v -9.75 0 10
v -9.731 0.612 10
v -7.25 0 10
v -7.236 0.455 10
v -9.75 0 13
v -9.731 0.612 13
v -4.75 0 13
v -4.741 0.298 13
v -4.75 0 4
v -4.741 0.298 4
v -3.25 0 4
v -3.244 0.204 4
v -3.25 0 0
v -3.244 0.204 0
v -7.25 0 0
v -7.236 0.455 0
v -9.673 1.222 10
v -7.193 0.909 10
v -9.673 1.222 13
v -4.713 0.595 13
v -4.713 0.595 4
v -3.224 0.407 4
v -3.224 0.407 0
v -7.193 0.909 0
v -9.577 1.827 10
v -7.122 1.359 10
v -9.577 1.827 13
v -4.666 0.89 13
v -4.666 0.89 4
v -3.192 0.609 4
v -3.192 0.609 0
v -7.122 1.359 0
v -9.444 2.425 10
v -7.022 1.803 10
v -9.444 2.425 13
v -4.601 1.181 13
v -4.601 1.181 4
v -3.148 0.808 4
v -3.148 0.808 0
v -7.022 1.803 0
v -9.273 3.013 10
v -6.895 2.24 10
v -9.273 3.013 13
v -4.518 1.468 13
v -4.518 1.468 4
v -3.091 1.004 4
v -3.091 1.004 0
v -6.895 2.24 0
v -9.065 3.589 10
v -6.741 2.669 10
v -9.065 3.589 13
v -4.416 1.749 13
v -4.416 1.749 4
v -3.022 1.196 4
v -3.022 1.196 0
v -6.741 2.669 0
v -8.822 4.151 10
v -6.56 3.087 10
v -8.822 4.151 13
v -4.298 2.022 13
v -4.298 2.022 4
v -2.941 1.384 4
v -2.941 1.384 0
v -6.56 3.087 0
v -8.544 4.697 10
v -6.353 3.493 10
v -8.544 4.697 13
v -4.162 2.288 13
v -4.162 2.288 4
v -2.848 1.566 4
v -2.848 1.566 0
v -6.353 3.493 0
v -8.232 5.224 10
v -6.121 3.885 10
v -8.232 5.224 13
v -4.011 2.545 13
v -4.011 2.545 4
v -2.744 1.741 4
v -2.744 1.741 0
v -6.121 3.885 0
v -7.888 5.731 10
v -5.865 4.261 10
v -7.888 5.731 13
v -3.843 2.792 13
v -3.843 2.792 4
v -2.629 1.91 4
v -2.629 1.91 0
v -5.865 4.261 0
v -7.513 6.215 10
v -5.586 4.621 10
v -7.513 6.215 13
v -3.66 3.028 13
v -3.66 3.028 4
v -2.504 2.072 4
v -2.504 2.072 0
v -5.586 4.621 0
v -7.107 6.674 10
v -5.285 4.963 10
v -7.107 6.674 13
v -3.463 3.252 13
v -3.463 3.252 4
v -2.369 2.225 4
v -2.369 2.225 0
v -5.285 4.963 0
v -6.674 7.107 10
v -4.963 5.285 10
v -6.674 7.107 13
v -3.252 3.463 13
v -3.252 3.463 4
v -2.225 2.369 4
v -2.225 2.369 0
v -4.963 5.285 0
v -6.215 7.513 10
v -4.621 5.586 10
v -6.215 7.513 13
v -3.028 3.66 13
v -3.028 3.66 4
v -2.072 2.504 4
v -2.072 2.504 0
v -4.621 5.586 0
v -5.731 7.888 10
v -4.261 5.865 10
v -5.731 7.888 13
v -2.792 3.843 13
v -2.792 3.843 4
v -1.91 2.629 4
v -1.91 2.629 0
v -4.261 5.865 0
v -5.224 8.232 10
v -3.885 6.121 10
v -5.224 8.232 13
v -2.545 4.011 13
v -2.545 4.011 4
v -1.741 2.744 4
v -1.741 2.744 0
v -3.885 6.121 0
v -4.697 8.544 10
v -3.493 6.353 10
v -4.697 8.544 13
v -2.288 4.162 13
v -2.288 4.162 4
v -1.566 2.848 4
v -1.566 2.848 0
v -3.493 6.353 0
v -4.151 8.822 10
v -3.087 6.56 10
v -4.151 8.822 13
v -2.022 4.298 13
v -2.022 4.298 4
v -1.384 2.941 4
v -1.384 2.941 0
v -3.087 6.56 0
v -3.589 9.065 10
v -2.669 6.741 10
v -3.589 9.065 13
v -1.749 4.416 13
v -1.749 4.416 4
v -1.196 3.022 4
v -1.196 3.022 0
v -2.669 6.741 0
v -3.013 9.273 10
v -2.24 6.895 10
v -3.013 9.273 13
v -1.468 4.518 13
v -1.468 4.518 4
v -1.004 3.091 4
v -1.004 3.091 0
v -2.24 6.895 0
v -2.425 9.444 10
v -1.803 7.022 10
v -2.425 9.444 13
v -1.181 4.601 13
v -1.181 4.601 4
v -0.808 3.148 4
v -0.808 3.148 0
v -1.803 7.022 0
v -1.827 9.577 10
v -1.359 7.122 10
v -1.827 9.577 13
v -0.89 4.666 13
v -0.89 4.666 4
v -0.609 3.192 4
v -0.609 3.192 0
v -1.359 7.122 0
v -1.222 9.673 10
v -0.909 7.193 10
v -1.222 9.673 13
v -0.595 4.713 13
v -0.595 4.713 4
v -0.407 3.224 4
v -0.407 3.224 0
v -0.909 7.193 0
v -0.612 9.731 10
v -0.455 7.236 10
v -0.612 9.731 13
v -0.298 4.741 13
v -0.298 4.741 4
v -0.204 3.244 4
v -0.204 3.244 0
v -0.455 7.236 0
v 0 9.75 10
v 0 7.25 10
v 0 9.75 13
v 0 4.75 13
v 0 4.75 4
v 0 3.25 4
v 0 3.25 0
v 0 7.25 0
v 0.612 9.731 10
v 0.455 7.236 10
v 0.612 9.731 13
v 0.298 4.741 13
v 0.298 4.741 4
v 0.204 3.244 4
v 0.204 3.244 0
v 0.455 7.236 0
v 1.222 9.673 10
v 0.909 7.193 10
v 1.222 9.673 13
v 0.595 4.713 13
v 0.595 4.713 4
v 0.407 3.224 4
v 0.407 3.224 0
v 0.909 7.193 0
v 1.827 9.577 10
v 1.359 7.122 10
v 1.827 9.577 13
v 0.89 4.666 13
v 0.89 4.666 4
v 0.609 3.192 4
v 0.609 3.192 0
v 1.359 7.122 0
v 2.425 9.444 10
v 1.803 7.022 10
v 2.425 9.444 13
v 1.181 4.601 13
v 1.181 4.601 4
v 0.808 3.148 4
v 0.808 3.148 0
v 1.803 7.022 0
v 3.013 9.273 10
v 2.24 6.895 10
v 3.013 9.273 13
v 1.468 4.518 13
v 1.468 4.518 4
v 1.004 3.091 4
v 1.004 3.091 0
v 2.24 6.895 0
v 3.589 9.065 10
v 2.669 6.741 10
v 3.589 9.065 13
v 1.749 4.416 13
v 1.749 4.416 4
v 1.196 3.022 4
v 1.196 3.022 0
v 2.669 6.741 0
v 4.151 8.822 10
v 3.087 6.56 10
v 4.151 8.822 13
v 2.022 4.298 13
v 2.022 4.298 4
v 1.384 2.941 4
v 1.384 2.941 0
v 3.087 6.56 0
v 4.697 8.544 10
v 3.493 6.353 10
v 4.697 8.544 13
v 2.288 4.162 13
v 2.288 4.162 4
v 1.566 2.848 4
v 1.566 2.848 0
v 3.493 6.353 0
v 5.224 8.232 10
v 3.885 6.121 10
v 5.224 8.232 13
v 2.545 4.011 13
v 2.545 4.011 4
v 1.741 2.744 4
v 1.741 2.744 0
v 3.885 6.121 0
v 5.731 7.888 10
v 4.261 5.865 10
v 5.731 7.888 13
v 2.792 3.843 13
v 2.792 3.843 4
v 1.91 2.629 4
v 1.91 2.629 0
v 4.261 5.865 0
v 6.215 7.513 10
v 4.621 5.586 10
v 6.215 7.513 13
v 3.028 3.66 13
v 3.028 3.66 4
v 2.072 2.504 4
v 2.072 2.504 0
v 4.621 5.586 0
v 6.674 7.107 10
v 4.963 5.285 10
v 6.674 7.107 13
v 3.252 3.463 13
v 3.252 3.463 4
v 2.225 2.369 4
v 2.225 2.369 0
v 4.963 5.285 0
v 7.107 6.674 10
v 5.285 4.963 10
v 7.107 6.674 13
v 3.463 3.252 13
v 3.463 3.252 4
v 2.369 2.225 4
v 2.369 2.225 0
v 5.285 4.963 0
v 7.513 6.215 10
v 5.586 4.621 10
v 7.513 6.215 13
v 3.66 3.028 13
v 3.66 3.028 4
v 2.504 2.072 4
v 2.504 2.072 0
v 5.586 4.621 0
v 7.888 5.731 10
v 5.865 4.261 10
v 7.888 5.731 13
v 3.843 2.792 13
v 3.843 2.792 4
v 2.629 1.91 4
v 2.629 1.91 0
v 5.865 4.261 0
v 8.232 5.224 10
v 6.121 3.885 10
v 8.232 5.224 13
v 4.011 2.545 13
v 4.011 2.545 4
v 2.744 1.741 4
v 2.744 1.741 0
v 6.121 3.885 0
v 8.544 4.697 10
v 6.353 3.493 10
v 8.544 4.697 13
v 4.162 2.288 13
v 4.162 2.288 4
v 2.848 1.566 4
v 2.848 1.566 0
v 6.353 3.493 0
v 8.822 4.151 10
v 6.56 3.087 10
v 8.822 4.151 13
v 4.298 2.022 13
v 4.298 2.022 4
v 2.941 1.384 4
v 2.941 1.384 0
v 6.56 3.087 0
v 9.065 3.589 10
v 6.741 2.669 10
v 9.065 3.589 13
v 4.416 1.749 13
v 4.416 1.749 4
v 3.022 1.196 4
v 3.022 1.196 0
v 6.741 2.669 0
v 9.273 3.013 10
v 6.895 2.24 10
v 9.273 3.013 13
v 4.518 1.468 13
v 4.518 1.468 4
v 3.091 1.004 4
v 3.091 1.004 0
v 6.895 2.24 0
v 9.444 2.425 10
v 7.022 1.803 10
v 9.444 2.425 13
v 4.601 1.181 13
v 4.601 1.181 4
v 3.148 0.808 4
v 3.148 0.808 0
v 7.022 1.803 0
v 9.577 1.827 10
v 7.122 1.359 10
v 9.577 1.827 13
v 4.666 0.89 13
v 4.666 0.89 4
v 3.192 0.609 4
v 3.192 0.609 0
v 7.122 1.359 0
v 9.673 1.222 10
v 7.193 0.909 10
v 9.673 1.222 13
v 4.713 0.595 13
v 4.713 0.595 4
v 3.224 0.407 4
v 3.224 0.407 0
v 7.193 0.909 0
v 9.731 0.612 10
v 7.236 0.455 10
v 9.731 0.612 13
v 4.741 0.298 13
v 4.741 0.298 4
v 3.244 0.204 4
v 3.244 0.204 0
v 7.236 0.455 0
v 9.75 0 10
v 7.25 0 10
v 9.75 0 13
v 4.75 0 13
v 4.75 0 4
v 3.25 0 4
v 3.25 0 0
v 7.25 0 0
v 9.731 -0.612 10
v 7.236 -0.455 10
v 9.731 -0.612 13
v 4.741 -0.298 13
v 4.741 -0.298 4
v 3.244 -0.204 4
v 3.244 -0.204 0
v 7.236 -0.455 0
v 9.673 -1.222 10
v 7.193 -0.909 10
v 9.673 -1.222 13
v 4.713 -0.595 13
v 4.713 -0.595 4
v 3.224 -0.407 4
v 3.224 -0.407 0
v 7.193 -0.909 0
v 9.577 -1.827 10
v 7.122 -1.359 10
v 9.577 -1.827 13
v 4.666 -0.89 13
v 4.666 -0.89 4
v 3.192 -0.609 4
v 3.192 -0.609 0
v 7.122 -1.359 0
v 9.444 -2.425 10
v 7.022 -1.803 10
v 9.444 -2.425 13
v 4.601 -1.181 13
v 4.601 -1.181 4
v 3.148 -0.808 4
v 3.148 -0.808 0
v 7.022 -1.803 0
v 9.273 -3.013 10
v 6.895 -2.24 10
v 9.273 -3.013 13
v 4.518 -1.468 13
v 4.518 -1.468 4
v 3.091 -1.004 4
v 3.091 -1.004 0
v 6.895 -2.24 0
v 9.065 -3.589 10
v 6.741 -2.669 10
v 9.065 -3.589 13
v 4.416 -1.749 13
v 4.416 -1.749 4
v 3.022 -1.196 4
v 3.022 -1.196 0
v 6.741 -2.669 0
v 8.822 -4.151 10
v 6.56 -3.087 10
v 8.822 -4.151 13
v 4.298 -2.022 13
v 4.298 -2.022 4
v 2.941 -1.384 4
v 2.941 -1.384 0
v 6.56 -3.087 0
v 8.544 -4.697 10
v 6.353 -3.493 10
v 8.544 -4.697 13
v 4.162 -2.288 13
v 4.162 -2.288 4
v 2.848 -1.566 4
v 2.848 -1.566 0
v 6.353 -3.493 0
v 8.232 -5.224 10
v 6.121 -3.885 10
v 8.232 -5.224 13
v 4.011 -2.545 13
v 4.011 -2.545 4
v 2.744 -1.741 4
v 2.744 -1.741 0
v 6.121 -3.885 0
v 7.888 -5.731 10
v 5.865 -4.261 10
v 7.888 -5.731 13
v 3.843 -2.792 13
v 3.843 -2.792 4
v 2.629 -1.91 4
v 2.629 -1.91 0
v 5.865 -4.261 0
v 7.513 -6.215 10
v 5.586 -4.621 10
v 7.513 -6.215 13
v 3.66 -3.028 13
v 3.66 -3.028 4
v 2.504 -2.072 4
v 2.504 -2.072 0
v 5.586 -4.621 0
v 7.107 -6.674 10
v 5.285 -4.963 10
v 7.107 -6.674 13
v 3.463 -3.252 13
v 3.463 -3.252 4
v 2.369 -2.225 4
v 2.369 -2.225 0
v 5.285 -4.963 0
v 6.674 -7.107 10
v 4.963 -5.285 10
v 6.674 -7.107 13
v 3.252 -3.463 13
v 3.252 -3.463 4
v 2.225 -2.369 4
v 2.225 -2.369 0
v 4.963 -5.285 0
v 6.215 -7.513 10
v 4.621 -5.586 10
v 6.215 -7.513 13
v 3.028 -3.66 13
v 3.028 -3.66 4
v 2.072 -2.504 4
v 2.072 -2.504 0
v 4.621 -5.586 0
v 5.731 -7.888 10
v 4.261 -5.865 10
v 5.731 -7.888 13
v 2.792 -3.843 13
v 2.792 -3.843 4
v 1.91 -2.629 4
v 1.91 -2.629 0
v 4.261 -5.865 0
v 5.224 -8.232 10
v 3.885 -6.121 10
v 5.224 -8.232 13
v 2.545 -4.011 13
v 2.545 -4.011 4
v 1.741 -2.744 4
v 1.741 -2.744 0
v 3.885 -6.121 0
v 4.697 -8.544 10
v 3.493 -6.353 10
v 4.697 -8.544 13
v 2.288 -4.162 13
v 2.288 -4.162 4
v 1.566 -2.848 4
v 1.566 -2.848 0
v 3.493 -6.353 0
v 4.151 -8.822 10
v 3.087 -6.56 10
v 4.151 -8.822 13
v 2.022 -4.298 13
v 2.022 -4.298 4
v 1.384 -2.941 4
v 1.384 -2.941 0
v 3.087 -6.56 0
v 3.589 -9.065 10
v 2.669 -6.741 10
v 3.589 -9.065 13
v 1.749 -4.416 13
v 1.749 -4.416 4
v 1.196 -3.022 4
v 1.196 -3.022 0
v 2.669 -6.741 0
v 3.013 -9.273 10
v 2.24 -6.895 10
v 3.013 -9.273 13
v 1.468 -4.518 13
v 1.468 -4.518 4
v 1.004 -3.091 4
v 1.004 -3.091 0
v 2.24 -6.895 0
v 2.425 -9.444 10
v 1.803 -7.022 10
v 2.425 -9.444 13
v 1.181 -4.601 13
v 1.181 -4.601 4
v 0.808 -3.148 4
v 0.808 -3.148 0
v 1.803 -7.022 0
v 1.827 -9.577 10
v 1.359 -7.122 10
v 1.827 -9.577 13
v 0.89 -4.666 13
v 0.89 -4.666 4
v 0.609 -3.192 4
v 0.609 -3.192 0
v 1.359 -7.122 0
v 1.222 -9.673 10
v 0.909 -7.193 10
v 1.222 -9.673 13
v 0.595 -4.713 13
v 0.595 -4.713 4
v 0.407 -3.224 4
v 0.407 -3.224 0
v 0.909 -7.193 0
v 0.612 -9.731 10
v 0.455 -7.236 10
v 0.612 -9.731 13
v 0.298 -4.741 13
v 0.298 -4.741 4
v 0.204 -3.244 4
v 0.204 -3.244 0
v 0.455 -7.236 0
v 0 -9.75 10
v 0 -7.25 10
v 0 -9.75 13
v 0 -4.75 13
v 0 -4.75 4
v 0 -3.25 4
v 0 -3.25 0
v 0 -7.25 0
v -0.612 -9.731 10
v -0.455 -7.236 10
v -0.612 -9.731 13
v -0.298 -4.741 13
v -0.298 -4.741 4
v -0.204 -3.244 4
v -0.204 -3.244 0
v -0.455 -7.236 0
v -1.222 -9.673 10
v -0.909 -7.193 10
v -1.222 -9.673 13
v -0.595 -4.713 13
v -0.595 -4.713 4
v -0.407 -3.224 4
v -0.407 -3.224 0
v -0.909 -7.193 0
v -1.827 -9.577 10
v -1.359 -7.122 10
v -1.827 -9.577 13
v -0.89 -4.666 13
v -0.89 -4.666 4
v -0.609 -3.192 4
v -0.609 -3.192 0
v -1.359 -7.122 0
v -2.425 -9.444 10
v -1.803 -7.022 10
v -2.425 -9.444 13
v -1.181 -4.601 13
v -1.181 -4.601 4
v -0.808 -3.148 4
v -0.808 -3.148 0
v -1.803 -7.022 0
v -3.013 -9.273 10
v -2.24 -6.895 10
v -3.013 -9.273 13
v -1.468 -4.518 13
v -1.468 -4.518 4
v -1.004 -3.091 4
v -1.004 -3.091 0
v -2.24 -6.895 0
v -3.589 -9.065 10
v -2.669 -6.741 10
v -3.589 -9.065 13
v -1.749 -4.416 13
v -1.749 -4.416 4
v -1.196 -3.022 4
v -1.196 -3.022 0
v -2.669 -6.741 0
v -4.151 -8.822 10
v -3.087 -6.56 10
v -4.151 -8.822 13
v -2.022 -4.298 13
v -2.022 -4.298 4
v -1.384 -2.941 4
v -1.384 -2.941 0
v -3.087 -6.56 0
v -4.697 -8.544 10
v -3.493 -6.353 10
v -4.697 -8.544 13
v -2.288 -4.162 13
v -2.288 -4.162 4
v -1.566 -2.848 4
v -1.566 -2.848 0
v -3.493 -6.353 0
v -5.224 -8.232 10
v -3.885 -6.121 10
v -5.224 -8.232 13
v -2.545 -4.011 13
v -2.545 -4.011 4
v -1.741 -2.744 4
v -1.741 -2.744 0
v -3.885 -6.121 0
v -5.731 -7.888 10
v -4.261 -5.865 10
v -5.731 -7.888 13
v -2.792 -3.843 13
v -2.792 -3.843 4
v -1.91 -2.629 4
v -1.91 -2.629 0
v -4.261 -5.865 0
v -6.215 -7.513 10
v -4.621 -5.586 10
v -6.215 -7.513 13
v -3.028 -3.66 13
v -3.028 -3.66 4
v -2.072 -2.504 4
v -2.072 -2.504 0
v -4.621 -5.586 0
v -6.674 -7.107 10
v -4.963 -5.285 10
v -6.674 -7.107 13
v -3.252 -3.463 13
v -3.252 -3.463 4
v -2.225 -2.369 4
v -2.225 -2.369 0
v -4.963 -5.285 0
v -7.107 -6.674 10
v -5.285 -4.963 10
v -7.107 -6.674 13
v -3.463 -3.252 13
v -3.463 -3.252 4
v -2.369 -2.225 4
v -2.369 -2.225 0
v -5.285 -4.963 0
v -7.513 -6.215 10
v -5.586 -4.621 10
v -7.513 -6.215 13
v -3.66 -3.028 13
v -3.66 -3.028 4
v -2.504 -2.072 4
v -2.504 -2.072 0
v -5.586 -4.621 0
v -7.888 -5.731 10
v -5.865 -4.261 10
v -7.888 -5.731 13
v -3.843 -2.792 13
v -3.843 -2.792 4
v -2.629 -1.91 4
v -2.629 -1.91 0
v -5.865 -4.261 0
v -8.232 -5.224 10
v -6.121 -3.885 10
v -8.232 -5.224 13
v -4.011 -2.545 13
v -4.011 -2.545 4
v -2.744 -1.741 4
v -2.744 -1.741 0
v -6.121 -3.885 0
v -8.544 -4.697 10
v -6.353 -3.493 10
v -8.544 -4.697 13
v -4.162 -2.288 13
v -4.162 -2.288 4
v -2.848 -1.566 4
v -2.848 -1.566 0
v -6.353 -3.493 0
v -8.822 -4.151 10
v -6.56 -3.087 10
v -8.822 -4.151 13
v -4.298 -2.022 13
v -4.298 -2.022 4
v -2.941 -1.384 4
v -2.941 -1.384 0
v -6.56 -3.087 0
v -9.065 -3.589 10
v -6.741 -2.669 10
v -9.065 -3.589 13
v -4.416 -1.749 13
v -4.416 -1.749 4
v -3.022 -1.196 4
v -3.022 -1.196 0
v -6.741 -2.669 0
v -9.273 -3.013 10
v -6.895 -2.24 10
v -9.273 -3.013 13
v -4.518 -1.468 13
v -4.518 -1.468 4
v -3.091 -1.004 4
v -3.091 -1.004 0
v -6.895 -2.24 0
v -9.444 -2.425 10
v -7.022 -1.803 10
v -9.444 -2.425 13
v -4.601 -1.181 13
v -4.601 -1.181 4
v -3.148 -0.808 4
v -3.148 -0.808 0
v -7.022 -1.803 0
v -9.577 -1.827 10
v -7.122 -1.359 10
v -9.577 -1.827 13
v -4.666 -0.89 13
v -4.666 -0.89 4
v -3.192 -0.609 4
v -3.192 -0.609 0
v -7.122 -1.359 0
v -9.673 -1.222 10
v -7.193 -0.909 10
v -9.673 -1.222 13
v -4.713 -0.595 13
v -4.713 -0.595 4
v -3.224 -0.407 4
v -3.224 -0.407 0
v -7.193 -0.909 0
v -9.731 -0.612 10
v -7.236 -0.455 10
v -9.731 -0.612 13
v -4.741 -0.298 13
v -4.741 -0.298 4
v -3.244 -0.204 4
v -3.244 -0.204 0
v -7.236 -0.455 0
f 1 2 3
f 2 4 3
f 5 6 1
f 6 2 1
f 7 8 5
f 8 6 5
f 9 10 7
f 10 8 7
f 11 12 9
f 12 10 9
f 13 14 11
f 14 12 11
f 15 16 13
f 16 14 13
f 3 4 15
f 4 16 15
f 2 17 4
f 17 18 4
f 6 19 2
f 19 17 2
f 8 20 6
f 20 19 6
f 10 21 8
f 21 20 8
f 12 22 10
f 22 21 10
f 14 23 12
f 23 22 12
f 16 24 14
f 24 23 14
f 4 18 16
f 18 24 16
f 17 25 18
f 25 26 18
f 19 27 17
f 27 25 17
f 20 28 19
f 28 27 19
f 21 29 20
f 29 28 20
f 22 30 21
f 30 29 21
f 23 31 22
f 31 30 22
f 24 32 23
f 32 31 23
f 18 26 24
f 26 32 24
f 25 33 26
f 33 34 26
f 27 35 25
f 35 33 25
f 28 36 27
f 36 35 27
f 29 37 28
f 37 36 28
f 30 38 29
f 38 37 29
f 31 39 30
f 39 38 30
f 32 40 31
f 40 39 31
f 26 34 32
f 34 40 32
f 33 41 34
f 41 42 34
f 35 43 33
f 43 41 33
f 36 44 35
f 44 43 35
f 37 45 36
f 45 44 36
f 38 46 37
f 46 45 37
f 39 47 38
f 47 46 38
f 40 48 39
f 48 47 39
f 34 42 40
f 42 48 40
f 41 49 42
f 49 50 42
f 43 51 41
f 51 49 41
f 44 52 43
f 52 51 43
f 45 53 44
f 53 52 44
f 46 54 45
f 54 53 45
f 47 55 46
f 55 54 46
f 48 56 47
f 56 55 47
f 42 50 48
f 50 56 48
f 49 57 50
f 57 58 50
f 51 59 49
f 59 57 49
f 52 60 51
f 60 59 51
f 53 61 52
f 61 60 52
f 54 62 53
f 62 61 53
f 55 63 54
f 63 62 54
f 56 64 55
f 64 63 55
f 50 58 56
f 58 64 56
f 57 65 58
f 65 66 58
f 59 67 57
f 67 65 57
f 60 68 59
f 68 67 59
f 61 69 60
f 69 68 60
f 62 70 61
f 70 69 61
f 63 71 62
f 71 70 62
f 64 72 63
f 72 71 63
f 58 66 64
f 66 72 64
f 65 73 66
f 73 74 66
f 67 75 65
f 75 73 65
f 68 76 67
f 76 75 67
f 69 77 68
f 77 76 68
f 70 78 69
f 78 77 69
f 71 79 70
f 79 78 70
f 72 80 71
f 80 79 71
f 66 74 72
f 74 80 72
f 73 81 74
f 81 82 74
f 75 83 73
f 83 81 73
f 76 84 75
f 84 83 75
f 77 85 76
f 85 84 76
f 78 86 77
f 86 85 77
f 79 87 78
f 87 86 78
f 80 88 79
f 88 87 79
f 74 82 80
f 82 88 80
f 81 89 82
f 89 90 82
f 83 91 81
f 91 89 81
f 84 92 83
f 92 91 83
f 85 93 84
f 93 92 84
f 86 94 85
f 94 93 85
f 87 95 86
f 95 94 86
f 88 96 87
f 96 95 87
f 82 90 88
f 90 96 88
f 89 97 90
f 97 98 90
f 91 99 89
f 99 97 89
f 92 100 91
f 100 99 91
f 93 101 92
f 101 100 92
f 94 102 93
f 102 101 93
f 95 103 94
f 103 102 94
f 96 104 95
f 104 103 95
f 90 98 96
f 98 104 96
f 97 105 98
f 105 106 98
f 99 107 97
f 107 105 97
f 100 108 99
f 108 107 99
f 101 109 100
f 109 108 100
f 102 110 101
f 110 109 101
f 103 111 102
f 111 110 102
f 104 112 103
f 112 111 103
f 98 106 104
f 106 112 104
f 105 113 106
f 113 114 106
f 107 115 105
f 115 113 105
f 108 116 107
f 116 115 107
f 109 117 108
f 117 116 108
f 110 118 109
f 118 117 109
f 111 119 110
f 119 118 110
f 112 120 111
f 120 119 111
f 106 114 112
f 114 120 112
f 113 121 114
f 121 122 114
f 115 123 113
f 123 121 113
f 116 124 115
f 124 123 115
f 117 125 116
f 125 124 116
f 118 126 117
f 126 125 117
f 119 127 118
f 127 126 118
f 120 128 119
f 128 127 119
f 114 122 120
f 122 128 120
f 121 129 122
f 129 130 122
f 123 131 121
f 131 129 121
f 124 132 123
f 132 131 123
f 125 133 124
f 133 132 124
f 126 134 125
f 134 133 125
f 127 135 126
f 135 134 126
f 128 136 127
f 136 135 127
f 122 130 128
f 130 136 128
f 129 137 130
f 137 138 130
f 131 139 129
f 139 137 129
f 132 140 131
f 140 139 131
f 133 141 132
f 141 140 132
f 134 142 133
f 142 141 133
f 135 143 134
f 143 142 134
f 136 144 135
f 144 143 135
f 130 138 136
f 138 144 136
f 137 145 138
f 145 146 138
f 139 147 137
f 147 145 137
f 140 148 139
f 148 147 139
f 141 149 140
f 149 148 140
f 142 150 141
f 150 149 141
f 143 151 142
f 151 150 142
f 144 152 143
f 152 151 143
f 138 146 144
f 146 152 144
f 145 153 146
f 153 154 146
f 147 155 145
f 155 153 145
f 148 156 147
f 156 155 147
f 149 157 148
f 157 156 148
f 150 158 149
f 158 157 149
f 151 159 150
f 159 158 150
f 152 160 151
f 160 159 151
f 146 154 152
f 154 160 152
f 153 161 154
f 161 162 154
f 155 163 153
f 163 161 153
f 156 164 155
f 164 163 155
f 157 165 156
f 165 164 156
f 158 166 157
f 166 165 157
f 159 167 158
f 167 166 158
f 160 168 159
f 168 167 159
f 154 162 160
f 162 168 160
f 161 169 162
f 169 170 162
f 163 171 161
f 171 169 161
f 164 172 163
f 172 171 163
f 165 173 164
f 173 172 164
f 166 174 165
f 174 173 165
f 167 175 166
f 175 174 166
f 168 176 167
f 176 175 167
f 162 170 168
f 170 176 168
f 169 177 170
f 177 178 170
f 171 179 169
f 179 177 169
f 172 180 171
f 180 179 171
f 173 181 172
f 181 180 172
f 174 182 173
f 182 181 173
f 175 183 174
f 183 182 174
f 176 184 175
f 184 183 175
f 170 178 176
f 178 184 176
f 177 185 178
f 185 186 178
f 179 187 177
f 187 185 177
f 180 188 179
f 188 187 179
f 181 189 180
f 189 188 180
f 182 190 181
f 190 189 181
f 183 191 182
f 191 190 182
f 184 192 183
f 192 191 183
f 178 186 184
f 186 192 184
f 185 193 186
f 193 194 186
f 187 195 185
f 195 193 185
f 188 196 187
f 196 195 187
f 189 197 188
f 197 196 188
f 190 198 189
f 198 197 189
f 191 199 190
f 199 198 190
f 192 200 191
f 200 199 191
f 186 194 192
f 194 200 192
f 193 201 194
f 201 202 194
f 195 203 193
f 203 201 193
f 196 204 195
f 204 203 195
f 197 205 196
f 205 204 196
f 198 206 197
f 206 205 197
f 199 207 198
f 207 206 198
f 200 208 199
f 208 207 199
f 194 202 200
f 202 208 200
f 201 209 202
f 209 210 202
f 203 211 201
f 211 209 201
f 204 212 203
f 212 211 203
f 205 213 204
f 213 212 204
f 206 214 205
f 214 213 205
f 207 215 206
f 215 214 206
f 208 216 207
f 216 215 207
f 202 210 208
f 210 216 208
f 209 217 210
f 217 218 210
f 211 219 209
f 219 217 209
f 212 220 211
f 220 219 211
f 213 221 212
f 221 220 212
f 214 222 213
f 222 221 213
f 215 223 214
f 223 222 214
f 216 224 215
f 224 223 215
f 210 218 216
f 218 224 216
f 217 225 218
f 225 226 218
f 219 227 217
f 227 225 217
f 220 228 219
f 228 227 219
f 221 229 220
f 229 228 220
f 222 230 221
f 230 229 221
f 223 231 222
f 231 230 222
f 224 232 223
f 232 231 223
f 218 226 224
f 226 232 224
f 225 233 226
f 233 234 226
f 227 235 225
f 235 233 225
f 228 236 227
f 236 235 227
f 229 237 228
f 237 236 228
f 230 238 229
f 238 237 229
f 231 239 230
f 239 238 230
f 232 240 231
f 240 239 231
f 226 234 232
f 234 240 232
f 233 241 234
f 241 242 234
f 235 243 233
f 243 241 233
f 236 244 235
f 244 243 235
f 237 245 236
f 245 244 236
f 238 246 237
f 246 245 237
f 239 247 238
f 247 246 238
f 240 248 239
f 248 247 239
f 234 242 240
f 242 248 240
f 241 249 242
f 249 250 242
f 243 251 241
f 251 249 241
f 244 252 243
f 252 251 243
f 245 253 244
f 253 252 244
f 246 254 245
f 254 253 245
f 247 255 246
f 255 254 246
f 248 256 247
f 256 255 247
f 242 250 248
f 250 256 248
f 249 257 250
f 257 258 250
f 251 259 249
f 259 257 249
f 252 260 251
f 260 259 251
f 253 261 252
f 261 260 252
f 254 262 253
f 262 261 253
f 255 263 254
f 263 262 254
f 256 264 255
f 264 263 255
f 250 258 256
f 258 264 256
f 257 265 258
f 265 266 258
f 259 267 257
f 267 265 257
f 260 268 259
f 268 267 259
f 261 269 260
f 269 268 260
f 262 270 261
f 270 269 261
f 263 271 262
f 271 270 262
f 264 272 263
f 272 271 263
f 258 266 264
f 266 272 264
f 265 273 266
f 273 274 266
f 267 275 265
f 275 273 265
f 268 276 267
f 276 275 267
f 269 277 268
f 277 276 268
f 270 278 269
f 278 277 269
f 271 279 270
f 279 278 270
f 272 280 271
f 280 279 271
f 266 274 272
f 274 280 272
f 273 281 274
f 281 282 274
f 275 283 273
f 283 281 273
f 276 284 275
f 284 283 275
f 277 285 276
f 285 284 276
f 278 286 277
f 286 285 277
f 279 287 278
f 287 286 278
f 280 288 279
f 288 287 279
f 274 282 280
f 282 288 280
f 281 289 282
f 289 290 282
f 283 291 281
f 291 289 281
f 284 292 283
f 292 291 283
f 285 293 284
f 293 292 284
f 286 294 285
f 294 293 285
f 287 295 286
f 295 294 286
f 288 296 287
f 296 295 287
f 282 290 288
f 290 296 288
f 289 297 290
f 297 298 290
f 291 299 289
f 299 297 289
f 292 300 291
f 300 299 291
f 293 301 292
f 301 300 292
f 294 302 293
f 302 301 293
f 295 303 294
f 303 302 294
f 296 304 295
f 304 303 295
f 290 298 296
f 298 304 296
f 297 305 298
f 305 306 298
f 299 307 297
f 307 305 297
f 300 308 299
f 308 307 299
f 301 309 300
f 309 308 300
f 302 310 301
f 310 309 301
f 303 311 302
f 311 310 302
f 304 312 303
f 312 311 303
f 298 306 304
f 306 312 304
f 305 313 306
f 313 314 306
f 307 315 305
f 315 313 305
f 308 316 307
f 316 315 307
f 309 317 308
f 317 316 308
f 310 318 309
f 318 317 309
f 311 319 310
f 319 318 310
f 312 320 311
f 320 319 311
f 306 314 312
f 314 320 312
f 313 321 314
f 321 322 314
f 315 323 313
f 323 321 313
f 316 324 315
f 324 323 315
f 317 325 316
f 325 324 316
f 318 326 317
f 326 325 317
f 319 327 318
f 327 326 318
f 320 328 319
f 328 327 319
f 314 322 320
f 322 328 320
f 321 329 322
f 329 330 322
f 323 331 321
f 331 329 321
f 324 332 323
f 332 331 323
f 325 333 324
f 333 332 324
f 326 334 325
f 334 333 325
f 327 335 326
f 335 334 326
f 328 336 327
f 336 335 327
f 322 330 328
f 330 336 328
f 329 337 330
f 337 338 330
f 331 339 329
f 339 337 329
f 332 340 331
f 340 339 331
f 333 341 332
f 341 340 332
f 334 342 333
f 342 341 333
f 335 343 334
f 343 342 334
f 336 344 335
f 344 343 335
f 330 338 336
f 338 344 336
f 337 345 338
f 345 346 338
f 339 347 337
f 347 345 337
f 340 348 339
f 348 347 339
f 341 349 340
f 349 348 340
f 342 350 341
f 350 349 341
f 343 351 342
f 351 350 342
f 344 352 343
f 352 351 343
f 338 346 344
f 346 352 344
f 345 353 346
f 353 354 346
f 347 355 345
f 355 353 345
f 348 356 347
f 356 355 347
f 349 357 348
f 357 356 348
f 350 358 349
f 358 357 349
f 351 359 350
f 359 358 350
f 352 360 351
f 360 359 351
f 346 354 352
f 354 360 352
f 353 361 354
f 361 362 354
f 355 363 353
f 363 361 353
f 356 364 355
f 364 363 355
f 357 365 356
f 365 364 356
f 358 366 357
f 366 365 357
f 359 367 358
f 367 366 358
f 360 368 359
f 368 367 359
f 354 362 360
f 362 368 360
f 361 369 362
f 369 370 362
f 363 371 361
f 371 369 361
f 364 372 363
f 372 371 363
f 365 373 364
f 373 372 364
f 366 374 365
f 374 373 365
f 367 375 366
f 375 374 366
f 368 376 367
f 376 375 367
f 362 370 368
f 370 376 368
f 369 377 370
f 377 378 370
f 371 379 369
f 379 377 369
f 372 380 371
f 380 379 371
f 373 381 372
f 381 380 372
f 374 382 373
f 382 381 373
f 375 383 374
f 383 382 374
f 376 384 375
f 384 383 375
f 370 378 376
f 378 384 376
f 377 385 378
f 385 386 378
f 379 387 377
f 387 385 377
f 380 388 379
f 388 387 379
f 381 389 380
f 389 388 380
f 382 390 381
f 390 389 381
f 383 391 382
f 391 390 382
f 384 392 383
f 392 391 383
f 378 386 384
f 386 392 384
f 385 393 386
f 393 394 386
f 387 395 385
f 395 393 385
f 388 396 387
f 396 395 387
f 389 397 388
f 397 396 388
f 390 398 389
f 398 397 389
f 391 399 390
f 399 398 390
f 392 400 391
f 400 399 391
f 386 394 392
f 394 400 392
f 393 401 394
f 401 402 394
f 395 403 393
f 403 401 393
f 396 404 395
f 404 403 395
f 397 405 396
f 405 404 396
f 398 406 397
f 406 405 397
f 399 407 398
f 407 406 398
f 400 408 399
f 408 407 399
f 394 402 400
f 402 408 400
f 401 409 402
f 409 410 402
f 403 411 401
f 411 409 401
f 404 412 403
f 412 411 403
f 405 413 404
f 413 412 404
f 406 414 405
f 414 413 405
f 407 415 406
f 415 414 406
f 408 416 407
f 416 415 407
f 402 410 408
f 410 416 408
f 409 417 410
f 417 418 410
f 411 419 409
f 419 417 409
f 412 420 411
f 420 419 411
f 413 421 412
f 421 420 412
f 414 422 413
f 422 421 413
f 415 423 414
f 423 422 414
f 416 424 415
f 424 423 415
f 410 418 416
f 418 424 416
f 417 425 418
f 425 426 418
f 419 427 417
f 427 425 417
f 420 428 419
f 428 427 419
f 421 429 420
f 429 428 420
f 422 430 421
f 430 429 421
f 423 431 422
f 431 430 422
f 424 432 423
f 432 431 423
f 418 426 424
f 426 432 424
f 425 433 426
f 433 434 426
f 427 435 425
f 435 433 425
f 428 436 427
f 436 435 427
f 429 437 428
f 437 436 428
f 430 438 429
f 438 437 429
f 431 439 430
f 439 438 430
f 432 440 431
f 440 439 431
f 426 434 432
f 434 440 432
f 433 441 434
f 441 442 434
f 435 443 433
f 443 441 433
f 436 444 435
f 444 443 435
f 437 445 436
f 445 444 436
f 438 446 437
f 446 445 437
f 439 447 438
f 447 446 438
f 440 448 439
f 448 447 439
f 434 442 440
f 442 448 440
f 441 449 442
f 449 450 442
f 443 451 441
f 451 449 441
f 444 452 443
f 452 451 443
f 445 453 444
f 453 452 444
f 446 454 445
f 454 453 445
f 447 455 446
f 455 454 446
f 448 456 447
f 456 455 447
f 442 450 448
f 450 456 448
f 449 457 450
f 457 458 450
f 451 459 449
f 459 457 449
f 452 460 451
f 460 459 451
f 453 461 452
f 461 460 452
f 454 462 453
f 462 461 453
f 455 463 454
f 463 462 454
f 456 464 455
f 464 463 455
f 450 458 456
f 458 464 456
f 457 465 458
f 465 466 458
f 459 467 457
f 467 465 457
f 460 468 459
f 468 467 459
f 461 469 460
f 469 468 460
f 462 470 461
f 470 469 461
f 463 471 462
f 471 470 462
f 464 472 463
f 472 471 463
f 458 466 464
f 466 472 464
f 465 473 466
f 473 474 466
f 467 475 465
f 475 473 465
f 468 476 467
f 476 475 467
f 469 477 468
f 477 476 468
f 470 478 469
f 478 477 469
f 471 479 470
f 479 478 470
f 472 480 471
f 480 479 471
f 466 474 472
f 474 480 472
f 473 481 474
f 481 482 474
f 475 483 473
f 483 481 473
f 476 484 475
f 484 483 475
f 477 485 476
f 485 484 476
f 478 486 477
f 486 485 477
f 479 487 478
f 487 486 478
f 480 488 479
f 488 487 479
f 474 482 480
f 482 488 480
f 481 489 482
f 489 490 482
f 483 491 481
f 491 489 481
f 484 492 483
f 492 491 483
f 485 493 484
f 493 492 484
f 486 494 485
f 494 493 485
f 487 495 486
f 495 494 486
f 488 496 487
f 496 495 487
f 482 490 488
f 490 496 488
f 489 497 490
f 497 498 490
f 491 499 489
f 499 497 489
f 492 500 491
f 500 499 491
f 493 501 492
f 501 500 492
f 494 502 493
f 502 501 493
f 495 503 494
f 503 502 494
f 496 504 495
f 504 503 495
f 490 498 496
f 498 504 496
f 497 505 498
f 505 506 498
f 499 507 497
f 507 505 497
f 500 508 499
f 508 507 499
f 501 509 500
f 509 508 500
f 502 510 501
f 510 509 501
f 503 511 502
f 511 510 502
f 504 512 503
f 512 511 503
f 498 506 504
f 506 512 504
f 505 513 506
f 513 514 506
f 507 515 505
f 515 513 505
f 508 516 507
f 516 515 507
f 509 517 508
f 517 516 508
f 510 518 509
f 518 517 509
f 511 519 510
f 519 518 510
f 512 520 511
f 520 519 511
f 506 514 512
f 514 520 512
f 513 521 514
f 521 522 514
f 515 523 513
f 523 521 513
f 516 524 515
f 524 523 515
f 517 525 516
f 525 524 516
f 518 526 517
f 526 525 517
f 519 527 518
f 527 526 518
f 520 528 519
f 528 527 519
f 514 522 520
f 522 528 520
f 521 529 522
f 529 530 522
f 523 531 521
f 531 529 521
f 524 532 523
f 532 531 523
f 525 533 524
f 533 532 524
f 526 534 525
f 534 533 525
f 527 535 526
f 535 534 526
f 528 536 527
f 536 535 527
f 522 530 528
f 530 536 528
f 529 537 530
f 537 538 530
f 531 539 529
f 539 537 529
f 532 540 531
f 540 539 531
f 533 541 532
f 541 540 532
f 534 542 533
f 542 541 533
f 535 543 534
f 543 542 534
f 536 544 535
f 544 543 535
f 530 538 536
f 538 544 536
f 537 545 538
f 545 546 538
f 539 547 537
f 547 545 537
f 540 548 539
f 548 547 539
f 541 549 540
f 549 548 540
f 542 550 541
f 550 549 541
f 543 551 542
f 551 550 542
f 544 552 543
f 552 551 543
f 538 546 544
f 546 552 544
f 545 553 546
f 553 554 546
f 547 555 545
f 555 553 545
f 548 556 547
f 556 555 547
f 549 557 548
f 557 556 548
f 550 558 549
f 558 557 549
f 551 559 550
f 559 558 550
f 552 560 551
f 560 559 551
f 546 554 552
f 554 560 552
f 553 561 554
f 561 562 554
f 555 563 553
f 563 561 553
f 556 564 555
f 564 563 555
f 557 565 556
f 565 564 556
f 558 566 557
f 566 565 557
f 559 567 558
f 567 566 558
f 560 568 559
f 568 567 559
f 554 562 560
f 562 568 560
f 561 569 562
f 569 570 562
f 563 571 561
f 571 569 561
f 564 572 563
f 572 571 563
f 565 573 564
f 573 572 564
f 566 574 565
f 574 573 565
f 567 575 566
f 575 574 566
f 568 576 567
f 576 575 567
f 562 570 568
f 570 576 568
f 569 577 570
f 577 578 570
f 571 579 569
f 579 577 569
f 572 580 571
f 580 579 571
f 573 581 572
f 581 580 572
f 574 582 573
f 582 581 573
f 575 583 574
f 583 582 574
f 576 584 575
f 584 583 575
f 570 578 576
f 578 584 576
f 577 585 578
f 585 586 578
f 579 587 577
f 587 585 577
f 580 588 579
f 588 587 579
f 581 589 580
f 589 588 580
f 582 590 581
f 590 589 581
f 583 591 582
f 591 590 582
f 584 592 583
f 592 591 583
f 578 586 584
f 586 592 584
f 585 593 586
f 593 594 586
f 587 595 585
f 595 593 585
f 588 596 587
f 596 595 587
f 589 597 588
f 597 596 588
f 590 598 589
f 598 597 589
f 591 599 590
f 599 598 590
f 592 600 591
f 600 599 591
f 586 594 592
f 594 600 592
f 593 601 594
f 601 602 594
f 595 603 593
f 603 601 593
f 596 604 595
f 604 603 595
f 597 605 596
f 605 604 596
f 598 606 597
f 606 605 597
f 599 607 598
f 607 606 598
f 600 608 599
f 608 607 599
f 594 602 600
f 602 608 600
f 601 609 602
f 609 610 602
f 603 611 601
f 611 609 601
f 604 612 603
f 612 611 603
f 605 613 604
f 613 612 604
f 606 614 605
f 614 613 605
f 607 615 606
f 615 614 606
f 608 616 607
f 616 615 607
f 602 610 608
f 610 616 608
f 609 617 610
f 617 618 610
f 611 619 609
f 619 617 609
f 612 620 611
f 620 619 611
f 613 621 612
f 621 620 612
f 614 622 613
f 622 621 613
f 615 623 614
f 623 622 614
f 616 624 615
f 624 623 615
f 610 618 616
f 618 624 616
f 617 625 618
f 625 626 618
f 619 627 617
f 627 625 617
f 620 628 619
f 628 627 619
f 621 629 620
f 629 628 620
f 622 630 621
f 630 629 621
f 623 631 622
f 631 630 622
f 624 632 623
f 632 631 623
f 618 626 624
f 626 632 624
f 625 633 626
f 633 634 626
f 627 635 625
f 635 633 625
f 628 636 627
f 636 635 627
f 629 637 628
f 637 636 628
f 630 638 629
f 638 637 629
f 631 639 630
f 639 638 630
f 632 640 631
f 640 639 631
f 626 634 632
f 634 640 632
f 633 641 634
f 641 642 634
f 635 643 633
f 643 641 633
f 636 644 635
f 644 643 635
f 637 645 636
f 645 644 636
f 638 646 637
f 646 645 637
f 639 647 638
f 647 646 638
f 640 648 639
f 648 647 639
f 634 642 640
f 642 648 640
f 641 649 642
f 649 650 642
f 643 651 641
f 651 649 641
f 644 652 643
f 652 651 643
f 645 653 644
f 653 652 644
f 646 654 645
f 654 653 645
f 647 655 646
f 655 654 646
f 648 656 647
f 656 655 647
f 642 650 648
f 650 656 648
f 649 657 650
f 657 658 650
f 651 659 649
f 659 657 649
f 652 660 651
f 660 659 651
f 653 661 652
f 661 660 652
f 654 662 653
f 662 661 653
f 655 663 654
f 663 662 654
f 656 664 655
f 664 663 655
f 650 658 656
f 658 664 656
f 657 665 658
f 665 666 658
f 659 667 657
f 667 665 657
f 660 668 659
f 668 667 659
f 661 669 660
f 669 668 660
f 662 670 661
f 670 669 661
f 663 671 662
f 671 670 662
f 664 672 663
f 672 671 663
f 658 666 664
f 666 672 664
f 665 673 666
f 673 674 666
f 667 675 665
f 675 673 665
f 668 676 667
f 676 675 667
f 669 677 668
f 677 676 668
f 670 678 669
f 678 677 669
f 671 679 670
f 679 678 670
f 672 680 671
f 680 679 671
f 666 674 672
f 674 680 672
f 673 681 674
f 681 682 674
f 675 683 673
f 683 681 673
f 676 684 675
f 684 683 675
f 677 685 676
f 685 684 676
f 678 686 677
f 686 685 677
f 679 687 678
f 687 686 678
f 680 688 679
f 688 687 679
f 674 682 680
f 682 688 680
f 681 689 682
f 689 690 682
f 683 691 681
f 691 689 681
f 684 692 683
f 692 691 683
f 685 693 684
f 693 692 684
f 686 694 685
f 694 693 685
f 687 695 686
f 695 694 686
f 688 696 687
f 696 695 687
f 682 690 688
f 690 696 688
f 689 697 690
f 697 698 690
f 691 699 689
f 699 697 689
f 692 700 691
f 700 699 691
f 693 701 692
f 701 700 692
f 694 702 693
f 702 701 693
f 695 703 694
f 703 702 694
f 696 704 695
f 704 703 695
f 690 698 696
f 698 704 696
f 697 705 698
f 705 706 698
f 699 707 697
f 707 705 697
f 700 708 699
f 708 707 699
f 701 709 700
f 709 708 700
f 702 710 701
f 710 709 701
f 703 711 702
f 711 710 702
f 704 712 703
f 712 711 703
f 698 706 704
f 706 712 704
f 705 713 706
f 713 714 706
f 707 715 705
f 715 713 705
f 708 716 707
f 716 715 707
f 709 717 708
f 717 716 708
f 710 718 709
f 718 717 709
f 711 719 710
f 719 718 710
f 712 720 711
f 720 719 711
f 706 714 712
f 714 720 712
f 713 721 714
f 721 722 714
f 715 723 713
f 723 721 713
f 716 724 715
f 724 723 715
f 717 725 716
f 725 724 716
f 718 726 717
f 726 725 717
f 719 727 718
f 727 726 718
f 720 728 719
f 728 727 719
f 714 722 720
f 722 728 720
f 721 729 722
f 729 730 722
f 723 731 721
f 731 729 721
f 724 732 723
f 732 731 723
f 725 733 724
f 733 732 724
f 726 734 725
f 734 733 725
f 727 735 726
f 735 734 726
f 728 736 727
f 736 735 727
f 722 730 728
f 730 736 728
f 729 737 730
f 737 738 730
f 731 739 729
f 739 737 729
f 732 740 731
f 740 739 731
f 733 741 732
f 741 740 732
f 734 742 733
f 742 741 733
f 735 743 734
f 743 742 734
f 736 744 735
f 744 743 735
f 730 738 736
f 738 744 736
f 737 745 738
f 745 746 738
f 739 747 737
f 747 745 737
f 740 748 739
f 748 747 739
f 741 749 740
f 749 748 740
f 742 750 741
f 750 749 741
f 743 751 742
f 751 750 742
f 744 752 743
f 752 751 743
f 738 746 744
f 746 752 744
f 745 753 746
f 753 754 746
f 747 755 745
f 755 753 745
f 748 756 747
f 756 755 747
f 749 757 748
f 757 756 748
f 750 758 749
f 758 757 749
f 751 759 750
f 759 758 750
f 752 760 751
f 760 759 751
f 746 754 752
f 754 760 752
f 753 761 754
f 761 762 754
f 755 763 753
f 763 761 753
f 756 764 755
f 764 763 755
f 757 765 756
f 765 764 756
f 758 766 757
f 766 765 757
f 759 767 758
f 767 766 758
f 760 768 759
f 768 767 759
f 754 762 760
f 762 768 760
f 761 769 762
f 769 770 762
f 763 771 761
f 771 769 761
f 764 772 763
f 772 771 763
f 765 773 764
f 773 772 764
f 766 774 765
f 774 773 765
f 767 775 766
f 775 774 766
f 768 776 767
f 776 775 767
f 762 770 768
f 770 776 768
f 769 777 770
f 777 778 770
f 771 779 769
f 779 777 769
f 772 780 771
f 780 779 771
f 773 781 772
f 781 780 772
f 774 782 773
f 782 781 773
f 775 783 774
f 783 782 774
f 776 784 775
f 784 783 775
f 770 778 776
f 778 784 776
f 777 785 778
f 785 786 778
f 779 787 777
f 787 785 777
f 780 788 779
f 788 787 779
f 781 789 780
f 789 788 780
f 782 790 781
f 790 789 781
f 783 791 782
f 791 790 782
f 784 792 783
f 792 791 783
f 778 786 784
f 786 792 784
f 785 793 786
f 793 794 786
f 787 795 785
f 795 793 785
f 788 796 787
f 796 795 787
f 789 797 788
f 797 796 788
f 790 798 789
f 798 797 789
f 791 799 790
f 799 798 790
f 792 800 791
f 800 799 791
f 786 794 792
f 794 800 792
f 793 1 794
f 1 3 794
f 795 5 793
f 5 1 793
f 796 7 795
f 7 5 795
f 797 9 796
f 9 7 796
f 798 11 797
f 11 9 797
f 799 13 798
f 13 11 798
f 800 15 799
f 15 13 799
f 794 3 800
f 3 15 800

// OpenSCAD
/*

|      _______
|     |   ___|
|     |  |
|     |  |
|     |  |
|   __|  |
|  |     |
|  |_____|
|
*/


inner_d1=6.5;
inner_d2=9.5;

inner_r1=inner_d1/2;
inner_r2=inner_d2/2;

outer_d1=14.5;
outer_d2=19.5;

outer_r1=outer_d1/2;
outer_r2=outer_d2/2;

h1=4;
h2=6;
h3=3;


rotate_extrude(angle=360, convexity=10, $fn=100)
polygon(points = [
    [inner_r1, 0],
    [inner_r1, h1],
    [inner_r2, h1],
    [inner_r2, h1+h2+h3],

    [outer_r2, h1+h2+h3],
    [outer_r2, h1+h2],
    [outer_r1, h1+h2],
    [outer_r1, 0],
]);
